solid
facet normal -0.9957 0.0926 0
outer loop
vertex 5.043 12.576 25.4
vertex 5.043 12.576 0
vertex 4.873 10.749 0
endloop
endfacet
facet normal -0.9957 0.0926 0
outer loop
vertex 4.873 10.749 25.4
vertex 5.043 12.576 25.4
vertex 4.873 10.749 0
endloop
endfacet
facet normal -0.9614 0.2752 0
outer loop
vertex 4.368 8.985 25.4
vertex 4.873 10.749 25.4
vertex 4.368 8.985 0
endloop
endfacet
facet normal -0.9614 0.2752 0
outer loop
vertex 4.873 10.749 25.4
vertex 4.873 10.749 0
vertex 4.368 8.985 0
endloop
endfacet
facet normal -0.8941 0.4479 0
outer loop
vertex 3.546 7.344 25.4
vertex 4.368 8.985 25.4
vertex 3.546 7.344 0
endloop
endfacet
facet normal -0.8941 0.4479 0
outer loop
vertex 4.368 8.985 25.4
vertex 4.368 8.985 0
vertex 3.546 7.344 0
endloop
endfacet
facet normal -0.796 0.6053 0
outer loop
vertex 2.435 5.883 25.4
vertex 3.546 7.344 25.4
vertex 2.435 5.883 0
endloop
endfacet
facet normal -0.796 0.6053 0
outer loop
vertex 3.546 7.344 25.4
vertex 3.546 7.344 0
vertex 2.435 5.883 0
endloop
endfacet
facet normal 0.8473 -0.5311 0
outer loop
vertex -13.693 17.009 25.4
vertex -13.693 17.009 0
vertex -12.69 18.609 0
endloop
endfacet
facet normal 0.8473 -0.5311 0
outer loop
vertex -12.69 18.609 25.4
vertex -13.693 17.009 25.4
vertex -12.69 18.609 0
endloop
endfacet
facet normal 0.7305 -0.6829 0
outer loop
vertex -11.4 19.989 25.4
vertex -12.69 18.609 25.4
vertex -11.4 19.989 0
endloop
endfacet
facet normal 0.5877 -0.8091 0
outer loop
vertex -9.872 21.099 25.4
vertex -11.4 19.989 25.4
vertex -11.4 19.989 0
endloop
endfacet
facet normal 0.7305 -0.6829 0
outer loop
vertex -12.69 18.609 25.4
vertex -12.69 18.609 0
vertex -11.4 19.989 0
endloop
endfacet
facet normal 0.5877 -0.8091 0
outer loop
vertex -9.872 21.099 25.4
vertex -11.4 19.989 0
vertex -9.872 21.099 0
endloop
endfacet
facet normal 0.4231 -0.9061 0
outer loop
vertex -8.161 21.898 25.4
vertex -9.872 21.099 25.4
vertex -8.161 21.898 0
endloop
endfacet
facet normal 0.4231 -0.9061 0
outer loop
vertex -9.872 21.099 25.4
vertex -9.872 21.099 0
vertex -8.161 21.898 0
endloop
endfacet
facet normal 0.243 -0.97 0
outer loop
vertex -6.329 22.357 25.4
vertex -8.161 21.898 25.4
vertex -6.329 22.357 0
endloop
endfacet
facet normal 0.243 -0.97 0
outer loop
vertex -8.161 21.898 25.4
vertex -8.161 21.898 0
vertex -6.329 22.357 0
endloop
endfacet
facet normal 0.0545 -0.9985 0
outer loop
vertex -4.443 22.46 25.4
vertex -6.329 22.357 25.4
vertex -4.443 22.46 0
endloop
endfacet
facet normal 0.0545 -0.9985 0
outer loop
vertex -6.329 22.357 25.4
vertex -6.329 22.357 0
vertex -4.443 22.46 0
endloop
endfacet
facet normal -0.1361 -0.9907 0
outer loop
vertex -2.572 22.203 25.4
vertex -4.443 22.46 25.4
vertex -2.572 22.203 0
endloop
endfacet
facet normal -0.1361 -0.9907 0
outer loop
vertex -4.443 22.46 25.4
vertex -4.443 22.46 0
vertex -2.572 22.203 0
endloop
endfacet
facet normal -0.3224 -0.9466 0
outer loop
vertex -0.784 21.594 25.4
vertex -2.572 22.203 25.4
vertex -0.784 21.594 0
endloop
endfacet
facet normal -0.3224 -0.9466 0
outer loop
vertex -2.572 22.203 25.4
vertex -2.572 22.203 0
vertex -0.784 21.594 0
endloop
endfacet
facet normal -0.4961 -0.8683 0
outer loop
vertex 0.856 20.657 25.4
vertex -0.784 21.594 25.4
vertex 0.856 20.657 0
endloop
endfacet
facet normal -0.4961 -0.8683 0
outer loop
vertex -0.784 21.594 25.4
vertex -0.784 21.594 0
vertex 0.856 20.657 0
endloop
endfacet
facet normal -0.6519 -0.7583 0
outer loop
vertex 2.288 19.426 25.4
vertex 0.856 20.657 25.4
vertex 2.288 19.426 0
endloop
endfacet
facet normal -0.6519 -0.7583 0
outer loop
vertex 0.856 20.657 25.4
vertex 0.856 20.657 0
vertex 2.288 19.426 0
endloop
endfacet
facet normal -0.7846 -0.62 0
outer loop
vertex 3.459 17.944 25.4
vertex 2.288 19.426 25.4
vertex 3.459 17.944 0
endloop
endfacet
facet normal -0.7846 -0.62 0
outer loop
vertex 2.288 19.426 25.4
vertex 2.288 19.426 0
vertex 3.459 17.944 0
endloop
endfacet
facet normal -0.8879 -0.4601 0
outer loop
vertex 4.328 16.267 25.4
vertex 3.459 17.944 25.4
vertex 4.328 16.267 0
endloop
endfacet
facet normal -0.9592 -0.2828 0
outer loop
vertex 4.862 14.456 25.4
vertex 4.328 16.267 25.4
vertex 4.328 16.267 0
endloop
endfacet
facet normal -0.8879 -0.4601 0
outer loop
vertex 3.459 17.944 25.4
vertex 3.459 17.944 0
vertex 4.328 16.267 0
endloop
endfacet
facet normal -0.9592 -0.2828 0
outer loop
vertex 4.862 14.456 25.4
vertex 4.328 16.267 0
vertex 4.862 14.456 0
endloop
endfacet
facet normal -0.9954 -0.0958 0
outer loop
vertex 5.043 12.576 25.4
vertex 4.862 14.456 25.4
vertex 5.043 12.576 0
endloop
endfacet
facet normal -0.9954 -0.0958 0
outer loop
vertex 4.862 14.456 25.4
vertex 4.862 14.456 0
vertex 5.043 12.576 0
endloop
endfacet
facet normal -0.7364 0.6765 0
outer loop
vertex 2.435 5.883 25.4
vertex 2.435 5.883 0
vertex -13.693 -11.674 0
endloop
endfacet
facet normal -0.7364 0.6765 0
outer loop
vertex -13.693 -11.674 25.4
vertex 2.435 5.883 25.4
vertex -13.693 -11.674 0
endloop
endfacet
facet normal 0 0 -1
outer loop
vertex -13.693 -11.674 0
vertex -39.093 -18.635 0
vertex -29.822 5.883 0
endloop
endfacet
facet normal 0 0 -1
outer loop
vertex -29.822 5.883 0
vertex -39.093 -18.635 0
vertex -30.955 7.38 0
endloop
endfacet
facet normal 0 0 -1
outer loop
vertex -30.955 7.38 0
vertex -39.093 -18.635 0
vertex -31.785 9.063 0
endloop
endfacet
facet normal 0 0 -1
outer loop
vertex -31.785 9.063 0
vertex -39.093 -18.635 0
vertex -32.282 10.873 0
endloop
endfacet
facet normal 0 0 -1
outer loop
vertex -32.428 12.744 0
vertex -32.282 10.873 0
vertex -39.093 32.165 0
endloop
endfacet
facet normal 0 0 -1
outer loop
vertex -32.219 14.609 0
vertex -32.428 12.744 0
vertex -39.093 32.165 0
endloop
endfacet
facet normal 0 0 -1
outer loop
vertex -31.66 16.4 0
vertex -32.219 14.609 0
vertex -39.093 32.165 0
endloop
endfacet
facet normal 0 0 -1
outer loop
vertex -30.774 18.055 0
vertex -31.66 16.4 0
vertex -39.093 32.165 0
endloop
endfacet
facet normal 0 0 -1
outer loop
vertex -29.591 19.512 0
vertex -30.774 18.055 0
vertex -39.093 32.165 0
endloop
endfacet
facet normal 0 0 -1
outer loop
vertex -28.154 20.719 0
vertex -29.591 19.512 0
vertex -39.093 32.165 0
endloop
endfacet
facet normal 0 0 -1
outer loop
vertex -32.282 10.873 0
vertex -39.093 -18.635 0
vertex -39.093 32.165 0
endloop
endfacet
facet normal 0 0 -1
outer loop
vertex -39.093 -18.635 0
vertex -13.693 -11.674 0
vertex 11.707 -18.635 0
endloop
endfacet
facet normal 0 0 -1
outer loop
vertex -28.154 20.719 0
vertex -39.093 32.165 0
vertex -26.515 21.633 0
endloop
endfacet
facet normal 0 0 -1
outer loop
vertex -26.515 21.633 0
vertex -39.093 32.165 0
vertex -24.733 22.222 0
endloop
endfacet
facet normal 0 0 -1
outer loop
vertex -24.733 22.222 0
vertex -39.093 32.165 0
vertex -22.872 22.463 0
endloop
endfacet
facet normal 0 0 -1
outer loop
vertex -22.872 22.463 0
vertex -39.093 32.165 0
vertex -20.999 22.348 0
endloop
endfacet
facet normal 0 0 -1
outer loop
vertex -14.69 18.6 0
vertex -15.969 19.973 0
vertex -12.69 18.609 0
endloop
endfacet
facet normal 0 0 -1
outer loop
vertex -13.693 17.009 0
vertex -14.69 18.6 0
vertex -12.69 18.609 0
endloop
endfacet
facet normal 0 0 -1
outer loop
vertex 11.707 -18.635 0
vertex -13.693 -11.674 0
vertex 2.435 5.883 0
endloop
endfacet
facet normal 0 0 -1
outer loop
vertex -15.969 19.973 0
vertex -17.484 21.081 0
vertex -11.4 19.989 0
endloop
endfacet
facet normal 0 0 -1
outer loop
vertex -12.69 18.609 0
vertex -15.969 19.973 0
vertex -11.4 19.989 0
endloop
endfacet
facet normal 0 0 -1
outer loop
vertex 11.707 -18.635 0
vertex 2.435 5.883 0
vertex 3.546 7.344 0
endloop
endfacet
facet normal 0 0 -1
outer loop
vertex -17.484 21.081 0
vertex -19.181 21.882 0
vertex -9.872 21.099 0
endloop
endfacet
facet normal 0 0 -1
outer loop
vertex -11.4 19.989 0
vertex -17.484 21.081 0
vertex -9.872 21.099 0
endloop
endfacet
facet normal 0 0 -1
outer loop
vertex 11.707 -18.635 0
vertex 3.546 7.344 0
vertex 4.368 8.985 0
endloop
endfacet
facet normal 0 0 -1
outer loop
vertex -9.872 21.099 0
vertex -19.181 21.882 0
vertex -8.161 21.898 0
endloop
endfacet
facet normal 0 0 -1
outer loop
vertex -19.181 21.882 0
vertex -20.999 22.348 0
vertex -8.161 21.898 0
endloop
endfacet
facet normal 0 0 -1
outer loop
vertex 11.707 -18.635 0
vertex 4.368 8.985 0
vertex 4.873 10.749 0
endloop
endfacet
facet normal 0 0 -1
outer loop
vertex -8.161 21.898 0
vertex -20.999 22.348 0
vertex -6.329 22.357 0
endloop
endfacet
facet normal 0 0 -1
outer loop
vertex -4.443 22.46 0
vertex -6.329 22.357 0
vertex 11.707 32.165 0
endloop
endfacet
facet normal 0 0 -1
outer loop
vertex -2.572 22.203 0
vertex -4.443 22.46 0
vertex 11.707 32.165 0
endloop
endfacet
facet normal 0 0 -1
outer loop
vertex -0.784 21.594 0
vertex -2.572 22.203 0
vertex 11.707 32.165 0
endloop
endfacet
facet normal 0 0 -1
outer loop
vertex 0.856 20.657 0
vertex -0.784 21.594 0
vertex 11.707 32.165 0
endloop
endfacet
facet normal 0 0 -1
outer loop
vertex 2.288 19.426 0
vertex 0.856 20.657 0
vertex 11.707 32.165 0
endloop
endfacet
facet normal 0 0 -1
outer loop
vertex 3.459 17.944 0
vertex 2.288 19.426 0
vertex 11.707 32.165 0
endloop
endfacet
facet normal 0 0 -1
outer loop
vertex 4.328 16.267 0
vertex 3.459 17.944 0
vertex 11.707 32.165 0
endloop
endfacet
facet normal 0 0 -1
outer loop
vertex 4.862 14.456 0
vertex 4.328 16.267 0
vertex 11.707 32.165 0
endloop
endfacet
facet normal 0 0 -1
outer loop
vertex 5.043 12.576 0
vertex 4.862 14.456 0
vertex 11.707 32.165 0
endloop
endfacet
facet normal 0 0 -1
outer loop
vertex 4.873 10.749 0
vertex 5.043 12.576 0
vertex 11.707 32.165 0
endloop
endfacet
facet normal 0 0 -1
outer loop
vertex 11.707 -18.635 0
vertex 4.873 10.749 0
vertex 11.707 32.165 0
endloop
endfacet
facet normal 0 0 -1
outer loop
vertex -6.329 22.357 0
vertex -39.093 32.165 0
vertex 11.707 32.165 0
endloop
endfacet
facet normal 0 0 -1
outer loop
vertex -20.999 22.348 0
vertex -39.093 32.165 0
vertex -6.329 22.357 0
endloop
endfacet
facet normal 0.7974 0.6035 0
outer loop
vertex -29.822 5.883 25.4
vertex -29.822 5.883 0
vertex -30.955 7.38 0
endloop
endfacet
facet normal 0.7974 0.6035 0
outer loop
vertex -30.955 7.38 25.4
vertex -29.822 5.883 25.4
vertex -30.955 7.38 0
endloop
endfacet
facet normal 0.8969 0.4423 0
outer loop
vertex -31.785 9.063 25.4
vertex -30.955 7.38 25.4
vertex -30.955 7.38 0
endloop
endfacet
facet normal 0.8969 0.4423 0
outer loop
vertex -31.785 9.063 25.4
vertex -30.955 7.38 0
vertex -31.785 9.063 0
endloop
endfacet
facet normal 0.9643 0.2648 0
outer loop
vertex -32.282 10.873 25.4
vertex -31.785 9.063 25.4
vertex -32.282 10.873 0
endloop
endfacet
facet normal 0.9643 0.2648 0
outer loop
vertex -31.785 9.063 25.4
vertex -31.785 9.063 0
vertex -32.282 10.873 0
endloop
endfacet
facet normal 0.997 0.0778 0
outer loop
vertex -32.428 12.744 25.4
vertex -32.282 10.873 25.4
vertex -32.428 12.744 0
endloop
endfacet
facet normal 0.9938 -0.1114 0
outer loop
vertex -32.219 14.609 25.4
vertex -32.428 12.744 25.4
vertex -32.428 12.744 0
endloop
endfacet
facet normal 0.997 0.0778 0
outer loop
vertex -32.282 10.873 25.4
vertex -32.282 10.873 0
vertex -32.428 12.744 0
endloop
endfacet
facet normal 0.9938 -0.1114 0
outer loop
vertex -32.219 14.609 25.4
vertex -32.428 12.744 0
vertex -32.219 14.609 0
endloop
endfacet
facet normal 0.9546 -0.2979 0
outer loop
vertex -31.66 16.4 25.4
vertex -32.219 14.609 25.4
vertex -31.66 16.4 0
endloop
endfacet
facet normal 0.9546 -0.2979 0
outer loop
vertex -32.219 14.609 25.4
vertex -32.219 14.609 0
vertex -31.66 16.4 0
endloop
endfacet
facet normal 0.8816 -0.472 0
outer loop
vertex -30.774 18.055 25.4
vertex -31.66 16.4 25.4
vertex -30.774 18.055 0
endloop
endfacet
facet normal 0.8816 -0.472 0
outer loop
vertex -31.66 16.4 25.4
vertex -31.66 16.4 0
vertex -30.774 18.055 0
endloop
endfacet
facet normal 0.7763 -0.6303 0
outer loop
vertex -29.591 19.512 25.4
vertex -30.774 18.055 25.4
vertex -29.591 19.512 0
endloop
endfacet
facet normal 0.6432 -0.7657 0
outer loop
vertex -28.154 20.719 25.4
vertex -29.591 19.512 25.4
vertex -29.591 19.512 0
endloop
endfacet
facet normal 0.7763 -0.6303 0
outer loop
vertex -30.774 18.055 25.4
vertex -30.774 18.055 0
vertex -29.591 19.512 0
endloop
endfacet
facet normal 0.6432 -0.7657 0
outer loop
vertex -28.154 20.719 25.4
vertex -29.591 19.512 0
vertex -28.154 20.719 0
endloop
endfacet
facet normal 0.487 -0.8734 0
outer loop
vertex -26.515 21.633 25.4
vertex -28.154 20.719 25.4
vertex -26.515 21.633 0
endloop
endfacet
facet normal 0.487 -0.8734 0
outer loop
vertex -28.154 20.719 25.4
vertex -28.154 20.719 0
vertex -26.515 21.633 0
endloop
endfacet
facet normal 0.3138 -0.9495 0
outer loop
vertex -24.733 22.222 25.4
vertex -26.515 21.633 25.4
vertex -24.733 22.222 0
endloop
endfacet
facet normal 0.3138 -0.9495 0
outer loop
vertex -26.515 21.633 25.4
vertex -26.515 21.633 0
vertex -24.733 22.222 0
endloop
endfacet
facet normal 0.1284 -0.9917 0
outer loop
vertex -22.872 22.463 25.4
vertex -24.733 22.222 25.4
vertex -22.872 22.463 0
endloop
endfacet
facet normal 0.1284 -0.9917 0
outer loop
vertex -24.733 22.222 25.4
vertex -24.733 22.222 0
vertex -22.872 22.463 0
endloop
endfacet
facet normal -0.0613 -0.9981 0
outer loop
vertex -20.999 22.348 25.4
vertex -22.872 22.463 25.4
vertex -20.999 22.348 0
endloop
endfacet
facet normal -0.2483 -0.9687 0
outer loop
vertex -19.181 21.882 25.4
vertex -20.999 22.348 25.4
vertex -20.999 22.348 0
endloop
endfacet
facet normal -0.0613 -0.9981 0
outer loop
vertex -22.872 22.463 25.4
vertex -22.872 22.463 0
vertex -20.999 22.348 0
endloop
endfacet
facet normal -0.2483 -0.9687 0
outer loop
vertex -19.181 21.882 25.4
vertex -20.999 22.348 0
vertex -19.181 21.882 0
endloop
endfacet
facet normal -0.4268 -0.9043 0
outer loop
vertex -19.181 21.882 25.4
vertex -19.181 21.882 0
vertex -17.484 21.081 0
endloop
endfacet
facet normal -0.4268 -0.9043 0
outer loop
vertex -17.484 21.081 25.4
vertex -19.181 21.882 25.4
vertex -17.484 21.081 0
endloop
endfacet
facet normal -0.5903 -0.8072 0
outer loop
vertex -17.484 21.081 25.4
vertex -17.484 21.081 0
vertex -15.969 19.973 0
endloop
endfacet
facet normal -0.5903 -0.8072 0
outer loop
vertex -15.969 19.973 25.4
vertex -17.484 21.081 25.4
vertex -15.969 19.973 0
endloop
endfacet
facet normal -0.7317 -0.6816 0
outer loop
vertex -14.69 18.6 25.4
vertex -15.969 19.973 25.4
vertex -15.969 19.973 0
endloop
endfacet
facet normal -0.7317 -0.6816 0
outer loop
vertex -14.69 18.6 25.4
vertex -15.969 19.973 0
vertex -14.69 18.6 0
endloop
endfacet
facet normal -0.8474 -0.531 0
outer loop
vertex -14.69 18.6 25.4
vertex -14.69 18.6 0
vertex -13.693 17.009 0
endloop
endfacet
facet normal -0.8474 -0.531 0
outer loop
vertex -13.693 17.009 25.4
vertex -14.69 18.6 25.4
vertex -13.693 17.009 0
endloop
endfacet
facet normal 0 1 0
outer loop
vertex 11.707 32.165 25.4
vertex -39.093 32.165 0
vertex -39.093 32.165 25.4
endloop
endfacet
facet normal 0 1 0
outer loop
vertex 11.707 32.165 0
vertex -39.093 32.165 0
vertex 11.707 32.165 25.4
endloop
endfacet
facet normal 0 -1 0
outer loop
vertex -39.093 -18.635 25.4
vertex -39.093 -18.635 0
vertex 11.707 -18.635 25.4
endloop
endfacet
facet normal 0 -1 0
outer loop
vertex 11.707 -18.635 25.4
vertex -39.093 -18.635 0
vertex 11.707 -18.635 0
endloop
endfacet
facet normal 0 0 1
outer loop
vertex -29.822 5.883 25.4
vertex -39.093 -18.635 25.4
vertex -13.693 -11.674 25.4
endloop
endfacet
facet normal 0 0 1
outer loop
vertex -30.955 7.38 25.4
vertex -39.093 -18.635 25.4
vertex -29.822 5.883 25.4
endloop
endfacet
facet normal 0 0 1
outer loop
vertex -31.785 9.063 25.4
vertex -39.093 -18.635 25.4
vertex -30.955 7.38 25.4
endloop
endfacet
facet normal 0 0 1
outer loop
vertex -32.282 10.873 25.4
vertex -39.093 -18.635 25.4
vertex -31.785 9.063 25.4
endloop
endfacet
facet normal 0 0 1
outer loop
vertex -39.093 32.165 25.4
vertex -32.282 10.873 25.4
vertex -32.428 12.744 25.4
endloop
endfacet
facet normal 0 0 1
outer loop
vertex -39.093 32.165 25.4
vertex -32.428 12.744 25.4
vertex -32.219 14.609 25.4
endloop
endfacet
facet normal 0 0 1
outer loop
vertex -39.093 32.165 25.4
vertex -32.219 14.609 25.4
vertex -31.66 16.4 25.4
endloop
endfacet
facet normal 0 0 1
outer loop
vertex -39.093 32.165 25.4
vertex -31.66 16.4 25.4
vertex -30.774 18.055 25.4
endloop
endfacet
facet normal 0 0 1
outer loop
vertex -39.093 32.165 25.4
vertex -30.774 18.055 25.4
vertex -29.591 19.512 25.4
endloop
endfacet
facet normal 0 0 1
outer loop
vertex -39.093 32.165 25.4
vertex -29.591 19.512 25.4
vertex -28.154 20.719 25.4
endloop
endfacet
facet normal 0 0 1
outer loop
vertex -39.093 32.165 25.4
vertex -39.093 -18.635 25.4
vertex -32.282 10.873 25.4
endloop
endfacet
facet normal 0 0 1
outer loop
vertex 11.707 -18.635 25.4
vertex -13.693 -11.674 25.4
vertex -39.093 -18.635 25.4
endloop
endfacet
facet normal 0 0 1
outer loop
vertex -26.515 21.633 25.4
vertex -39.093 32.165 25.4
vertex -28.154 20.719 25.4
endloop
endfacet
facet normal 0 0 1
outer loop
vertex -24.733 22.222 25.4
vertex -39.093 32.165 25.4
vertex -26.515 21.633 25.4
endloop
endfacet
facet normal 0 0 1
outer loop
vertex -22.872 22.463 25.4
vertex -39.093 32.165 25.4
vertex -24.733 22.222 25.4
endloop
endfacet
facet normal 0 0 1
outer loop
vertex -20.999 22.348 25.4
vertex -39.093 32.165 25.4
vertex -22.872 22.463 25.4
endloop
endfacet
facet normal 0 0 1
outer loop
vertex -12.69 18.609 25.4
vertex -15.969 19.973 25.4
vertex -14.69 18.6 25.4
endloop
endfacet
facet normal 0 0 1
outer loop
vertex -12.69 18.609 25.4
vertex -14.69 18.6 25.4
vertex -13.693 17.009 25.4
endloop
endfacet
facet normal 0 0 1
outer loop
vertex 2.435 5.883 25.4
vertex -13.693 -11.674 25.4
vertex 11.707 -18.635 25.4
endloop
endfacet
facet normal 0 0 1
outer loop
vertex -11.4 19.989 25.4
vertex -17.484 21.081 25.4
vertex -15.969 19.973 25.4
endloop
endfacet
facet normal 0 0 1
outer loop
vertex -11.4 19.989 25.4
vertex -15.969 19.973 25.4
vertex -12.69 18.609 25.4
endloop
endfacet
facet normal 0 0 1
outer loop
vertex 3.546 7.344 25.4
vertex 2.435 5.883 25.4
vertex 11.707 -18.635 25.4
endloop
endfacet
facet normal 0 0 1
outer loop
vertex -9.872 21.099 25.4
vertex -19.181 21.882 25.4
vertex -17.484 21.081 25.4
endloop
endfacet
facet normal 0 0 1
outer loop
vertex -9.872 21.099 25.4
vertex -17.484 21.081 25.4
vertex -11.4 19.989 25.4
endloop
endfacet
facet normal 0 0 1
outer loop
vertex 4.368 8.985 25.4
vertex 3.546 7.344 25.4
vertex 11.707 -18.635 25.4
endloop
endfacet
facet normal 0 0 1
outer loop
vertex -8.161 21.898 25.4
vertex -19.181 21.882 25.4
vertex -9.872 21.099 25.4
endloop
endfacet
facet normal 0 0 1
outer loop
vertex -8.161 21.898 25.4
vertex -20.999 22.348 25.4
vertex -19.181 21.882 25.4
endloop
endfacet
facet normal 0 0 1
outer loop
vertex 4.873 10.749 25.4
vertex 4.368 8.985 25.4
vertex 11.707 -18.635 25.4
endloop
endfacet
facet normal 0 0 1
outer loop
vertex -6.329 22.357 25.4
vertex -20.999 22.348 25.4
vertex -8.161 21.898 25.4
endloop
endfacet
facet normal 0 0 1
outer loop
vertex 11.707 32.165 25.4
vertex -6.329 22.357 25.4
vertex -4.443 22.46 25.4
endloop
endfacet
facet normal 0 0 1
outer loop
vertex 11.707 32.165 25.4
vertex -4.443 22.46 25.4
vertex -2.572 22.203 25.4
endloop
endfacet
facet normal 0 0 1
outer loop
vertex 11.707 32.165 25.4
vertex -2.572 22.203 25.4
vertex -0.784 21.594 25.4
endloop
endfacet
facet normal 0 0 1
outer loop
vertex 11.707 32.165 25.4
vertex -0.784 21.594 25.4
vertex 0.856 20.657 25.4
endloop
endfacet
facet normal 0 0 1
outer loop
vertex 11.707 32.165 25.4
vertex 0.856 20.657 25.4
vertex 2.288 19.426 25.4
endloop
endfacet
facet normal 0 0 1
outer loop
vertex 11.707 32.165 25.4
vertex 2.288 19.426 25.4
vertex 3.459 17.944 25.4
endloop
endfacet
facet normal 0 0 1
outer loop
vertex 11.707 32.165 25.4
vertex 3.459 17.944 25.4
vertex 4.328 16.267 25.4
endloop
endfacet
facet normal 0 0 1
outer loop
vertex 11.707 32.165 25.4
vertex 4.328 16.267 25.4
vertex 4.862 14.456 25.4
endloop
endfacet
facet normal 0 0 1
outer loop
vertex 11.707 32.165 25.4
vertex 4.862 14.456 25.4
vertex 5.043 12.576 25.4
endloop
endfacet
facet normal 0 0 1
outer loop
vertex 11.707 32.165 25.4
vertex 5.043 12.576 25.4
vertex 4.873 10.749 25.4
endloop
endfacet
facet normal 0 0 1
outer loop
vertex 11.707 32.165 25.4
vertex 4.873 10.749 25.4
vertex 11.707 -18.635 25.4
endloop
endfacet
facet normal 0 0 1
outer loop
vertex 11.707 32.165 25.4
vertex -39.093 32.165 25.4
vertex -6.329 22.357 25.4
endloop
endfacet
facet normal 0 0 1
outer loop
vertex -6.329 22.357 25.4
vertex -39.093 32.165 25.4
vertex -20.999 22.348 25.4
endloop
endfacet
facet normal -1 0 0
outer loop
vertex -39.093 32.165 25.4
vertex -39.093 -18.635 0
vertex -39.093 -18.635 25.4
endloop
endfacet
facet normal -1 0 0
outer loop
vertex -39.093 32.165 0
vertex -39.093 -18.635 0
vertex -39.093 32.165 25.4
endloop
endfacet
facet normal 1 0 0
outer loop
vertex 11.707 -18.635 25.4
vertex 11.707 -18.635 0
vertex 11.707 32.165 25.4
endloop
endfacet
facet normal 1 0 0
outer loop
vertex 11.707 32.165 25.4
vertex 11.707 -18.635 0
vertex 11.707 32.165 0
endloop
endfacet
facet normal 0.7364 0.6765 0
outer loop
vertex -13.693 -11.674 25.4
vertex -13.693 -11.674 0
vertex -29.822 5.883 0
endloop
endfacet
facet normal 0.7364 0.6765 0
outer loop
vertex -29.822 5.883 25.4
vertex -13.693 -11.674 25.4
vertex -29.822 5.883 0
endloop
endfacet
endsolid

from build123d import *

# Parameters (mm, degrees)
F0_W     = 50.8
F0_H     = 50.8
F1_DEPTH = 25.4


with BuildPart() as f1:
    # F0 (on Top) → F1 (new body)
    with BuildSketch(Plane.XY):
        with Locations((-13.693494, 6.764759)):
            Rectangle(F0_W, F0_H)
        with BuildLine():
            ThreePointArc((-29.822317, 5.883413), (-28.154331, 20.718998), (-13.693494, 17.00942))
            ThreePointArc((-13.693494, 17.00942), (-2.571968, 22.202675), (5.04269, 12.575878))
            ThreePointArc((5.04269, 12.575878), (4.367831, 8.984659), (2.435328, 5.883413))
            Line((2.435328, 5.883413), (-13.693494, -11.674106))
            Line((-13.693494, -11.674106), (-29.822317, 5.883413))
        make_face(mode=Mode.SUBTRACT)
    extrude(amount=F1_DEPTH)


solid = f1.part
